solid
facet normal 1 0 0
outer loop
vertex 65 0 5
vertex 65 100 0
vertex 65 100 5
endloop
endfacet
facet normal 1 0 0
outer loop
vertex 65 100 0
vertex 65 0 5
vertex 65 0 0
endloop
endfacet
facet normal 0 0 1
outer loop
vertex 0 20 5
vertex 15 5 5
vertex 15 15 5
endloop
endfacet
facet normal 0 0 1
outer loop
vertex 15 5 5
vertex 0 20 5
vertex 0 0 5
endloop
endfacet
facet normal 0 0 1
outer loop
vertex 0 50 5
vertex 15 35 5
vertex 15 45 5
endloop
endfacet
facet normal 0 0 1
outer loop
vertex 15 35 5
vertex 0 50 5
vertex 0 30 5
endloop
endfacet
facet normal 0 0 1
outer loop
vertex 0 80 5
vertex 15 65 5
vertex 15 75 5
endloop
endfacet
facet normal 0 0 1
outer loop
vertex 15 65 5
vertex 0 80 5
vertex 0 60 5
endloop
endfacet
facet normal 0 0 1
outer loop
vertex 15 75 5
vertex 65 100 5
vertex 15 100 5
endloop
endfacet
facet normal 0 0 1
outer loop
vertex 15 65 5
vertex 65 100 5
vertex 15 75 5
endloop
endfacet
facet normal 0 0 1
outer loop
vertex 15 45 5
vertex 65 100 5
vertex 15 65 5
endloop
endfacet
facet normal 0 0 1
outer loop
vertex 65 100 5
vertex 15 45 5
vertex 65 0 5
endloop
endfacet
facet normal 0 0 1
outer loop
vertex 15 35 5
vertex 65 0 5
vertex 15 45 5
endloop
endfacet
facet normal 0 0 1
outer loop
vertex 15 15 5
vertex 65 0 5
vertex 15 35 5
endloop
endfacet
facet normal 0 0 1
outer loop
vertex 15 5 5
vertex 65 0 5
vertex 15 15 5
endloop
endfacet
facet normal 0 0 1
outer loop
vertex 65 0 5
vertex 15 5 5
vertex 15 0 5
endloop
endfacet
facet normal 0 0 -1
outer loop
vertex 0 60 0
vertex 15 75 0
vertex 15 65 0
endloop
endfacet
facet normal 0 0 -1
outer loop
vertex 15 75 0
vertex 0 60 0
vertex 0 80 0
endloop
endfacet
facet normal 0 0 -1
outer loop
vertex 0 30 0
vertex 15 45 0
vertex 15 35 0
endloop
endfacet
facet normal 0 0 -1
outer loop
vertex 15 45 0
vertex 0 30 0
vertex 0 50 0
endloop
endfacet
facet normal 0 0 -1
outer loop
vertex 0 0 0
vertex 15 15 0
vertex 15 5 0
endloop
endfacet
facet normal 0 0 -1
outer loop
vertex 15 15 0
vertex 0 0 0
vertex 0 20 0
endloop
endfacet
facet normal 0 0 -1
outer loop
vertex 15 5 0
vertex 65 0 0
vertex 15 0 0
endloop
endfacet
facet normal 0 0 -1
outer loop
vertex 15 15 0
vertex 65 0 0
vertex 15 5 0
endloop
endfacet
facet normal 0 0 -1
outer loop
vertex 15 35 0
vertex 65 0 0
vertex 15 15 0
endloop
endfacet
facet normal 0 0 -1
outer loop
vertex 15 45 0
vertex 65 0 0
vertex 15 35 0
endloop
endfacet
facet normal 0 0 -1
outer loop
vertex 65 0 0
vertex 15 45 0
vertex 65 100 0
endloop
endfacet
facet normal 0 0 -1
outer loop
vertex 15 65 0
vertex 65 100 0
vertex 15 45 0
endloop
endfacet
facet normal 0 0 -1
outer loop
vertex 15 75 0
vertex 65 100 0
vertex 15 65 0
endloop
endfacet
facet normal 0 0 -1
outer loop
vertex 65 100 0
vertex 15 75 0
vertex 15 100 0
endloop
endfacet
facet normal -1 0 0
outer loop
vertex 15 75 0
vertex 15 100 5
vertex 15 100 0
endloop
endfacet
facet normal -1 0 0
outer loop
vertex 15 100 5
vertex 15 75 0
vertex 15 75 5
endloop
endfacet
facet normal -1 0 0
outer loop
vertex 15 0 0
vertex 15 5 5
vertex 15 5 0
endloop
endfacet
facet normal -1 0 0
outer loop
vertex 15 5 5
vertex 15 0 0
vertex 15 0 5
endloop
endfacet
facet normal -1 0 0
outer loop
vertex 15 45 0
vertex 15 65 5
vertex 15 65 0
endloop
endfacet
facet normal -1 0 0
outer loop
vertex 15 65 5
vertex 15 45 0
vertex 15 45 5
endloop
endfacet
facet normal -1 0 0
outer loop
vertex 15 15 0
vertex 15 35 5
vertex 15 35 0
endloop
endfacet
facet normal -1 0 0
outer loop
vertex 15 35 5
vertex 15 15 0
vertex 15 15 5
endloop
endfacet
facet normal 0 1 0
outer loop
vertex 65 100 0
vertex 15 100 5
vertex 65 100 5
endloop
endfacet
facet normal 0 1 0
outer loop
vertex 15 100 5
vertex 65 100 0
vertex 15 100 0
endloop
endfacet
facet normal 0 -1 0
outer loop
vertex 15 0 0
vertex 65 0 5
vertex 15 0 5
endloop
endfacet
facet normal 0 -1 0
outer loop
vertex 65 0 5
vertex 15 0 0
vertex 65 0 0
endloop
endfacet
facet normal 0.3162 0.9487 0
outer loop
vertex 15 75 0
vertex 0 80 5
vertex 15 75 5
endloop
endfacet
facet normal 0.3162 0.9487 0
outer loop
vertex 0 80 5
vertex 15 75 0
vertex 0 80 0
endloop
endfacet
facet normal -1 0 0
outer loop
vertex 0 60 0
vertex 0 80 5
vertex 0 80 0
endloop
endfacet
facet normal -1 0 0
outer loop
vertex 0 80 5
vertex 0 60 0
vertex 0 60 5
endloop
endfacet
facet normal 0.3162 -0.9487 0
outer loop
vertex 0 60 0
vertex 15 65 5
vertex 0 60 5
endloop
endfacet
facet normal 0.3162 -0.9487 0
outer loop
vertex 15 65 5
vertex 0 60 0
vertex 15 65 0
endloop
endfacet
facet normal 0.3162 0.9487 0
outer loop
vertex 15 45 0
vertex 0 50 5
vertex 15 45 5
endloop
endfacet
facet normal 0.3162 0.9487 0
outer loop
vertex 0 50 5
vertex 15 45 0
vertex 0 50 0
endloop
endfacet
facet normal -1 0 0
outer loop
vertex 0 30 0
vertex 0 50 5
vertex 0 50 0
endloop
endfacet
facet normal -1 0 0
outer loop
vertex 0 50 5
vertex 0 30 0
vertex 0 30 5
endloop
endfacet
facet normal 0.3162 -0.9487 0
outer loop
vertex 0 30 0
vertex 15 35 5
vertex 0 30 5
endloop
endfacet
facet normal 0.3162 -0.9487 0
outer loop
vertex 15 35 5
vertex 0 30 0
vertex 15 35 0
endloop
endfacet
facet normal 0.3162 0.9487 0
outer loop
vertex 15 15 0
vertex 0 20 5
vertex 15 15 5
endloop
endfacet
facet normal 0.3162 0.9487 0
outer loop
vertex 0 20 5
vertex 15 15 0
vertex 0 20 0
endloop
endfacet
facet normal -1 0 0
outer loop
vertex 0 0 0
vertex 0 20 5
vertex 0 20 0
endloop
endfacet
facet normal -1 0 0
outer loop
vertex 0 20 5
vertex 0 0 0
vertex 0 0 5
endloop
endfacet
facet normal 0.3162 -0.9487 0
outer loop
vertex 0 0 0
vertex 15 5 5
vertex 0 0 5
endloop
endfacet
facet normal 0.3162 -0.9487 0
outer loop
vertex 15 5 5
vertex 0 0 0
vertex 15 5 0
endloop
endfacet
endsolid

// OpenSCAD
module cutter() {

    scale([1.5, 1, 1]) child(0);

}

//cutter() cube(size = [100, 300, 10], center = true);

// Reduce size
//linear_extrude(height = 10) {
//}

module paf(thickness) {
    width = 20;
    height = 15;
    offset = 5;

    linear_extrude(height = thickness) {
    for ( i = [0 : 5] ) {
        translate([0, (width - offset) * i, 0]) {
            if (i % 2) {
                translate([height, 0, 1])
                    rotate([0, 180, 0])
                        % color("blue") polygon([[0, 0], [0, width], [height, width - offset], [height, offset]]);
            } else {
                translate([0, 0, 0]) {
                    polygon([[0, 0], [0, width], [height, width - offset], [height, offset]]);
                }
            }
        }
    }}
}

translate([-50, 0, 0]) {
    % color("blue") cube(size = [50, 100, 5]);
}

translate([15, 0, 0]) {
    cube(size = [50, 100, 5]);
}

paf(5);
